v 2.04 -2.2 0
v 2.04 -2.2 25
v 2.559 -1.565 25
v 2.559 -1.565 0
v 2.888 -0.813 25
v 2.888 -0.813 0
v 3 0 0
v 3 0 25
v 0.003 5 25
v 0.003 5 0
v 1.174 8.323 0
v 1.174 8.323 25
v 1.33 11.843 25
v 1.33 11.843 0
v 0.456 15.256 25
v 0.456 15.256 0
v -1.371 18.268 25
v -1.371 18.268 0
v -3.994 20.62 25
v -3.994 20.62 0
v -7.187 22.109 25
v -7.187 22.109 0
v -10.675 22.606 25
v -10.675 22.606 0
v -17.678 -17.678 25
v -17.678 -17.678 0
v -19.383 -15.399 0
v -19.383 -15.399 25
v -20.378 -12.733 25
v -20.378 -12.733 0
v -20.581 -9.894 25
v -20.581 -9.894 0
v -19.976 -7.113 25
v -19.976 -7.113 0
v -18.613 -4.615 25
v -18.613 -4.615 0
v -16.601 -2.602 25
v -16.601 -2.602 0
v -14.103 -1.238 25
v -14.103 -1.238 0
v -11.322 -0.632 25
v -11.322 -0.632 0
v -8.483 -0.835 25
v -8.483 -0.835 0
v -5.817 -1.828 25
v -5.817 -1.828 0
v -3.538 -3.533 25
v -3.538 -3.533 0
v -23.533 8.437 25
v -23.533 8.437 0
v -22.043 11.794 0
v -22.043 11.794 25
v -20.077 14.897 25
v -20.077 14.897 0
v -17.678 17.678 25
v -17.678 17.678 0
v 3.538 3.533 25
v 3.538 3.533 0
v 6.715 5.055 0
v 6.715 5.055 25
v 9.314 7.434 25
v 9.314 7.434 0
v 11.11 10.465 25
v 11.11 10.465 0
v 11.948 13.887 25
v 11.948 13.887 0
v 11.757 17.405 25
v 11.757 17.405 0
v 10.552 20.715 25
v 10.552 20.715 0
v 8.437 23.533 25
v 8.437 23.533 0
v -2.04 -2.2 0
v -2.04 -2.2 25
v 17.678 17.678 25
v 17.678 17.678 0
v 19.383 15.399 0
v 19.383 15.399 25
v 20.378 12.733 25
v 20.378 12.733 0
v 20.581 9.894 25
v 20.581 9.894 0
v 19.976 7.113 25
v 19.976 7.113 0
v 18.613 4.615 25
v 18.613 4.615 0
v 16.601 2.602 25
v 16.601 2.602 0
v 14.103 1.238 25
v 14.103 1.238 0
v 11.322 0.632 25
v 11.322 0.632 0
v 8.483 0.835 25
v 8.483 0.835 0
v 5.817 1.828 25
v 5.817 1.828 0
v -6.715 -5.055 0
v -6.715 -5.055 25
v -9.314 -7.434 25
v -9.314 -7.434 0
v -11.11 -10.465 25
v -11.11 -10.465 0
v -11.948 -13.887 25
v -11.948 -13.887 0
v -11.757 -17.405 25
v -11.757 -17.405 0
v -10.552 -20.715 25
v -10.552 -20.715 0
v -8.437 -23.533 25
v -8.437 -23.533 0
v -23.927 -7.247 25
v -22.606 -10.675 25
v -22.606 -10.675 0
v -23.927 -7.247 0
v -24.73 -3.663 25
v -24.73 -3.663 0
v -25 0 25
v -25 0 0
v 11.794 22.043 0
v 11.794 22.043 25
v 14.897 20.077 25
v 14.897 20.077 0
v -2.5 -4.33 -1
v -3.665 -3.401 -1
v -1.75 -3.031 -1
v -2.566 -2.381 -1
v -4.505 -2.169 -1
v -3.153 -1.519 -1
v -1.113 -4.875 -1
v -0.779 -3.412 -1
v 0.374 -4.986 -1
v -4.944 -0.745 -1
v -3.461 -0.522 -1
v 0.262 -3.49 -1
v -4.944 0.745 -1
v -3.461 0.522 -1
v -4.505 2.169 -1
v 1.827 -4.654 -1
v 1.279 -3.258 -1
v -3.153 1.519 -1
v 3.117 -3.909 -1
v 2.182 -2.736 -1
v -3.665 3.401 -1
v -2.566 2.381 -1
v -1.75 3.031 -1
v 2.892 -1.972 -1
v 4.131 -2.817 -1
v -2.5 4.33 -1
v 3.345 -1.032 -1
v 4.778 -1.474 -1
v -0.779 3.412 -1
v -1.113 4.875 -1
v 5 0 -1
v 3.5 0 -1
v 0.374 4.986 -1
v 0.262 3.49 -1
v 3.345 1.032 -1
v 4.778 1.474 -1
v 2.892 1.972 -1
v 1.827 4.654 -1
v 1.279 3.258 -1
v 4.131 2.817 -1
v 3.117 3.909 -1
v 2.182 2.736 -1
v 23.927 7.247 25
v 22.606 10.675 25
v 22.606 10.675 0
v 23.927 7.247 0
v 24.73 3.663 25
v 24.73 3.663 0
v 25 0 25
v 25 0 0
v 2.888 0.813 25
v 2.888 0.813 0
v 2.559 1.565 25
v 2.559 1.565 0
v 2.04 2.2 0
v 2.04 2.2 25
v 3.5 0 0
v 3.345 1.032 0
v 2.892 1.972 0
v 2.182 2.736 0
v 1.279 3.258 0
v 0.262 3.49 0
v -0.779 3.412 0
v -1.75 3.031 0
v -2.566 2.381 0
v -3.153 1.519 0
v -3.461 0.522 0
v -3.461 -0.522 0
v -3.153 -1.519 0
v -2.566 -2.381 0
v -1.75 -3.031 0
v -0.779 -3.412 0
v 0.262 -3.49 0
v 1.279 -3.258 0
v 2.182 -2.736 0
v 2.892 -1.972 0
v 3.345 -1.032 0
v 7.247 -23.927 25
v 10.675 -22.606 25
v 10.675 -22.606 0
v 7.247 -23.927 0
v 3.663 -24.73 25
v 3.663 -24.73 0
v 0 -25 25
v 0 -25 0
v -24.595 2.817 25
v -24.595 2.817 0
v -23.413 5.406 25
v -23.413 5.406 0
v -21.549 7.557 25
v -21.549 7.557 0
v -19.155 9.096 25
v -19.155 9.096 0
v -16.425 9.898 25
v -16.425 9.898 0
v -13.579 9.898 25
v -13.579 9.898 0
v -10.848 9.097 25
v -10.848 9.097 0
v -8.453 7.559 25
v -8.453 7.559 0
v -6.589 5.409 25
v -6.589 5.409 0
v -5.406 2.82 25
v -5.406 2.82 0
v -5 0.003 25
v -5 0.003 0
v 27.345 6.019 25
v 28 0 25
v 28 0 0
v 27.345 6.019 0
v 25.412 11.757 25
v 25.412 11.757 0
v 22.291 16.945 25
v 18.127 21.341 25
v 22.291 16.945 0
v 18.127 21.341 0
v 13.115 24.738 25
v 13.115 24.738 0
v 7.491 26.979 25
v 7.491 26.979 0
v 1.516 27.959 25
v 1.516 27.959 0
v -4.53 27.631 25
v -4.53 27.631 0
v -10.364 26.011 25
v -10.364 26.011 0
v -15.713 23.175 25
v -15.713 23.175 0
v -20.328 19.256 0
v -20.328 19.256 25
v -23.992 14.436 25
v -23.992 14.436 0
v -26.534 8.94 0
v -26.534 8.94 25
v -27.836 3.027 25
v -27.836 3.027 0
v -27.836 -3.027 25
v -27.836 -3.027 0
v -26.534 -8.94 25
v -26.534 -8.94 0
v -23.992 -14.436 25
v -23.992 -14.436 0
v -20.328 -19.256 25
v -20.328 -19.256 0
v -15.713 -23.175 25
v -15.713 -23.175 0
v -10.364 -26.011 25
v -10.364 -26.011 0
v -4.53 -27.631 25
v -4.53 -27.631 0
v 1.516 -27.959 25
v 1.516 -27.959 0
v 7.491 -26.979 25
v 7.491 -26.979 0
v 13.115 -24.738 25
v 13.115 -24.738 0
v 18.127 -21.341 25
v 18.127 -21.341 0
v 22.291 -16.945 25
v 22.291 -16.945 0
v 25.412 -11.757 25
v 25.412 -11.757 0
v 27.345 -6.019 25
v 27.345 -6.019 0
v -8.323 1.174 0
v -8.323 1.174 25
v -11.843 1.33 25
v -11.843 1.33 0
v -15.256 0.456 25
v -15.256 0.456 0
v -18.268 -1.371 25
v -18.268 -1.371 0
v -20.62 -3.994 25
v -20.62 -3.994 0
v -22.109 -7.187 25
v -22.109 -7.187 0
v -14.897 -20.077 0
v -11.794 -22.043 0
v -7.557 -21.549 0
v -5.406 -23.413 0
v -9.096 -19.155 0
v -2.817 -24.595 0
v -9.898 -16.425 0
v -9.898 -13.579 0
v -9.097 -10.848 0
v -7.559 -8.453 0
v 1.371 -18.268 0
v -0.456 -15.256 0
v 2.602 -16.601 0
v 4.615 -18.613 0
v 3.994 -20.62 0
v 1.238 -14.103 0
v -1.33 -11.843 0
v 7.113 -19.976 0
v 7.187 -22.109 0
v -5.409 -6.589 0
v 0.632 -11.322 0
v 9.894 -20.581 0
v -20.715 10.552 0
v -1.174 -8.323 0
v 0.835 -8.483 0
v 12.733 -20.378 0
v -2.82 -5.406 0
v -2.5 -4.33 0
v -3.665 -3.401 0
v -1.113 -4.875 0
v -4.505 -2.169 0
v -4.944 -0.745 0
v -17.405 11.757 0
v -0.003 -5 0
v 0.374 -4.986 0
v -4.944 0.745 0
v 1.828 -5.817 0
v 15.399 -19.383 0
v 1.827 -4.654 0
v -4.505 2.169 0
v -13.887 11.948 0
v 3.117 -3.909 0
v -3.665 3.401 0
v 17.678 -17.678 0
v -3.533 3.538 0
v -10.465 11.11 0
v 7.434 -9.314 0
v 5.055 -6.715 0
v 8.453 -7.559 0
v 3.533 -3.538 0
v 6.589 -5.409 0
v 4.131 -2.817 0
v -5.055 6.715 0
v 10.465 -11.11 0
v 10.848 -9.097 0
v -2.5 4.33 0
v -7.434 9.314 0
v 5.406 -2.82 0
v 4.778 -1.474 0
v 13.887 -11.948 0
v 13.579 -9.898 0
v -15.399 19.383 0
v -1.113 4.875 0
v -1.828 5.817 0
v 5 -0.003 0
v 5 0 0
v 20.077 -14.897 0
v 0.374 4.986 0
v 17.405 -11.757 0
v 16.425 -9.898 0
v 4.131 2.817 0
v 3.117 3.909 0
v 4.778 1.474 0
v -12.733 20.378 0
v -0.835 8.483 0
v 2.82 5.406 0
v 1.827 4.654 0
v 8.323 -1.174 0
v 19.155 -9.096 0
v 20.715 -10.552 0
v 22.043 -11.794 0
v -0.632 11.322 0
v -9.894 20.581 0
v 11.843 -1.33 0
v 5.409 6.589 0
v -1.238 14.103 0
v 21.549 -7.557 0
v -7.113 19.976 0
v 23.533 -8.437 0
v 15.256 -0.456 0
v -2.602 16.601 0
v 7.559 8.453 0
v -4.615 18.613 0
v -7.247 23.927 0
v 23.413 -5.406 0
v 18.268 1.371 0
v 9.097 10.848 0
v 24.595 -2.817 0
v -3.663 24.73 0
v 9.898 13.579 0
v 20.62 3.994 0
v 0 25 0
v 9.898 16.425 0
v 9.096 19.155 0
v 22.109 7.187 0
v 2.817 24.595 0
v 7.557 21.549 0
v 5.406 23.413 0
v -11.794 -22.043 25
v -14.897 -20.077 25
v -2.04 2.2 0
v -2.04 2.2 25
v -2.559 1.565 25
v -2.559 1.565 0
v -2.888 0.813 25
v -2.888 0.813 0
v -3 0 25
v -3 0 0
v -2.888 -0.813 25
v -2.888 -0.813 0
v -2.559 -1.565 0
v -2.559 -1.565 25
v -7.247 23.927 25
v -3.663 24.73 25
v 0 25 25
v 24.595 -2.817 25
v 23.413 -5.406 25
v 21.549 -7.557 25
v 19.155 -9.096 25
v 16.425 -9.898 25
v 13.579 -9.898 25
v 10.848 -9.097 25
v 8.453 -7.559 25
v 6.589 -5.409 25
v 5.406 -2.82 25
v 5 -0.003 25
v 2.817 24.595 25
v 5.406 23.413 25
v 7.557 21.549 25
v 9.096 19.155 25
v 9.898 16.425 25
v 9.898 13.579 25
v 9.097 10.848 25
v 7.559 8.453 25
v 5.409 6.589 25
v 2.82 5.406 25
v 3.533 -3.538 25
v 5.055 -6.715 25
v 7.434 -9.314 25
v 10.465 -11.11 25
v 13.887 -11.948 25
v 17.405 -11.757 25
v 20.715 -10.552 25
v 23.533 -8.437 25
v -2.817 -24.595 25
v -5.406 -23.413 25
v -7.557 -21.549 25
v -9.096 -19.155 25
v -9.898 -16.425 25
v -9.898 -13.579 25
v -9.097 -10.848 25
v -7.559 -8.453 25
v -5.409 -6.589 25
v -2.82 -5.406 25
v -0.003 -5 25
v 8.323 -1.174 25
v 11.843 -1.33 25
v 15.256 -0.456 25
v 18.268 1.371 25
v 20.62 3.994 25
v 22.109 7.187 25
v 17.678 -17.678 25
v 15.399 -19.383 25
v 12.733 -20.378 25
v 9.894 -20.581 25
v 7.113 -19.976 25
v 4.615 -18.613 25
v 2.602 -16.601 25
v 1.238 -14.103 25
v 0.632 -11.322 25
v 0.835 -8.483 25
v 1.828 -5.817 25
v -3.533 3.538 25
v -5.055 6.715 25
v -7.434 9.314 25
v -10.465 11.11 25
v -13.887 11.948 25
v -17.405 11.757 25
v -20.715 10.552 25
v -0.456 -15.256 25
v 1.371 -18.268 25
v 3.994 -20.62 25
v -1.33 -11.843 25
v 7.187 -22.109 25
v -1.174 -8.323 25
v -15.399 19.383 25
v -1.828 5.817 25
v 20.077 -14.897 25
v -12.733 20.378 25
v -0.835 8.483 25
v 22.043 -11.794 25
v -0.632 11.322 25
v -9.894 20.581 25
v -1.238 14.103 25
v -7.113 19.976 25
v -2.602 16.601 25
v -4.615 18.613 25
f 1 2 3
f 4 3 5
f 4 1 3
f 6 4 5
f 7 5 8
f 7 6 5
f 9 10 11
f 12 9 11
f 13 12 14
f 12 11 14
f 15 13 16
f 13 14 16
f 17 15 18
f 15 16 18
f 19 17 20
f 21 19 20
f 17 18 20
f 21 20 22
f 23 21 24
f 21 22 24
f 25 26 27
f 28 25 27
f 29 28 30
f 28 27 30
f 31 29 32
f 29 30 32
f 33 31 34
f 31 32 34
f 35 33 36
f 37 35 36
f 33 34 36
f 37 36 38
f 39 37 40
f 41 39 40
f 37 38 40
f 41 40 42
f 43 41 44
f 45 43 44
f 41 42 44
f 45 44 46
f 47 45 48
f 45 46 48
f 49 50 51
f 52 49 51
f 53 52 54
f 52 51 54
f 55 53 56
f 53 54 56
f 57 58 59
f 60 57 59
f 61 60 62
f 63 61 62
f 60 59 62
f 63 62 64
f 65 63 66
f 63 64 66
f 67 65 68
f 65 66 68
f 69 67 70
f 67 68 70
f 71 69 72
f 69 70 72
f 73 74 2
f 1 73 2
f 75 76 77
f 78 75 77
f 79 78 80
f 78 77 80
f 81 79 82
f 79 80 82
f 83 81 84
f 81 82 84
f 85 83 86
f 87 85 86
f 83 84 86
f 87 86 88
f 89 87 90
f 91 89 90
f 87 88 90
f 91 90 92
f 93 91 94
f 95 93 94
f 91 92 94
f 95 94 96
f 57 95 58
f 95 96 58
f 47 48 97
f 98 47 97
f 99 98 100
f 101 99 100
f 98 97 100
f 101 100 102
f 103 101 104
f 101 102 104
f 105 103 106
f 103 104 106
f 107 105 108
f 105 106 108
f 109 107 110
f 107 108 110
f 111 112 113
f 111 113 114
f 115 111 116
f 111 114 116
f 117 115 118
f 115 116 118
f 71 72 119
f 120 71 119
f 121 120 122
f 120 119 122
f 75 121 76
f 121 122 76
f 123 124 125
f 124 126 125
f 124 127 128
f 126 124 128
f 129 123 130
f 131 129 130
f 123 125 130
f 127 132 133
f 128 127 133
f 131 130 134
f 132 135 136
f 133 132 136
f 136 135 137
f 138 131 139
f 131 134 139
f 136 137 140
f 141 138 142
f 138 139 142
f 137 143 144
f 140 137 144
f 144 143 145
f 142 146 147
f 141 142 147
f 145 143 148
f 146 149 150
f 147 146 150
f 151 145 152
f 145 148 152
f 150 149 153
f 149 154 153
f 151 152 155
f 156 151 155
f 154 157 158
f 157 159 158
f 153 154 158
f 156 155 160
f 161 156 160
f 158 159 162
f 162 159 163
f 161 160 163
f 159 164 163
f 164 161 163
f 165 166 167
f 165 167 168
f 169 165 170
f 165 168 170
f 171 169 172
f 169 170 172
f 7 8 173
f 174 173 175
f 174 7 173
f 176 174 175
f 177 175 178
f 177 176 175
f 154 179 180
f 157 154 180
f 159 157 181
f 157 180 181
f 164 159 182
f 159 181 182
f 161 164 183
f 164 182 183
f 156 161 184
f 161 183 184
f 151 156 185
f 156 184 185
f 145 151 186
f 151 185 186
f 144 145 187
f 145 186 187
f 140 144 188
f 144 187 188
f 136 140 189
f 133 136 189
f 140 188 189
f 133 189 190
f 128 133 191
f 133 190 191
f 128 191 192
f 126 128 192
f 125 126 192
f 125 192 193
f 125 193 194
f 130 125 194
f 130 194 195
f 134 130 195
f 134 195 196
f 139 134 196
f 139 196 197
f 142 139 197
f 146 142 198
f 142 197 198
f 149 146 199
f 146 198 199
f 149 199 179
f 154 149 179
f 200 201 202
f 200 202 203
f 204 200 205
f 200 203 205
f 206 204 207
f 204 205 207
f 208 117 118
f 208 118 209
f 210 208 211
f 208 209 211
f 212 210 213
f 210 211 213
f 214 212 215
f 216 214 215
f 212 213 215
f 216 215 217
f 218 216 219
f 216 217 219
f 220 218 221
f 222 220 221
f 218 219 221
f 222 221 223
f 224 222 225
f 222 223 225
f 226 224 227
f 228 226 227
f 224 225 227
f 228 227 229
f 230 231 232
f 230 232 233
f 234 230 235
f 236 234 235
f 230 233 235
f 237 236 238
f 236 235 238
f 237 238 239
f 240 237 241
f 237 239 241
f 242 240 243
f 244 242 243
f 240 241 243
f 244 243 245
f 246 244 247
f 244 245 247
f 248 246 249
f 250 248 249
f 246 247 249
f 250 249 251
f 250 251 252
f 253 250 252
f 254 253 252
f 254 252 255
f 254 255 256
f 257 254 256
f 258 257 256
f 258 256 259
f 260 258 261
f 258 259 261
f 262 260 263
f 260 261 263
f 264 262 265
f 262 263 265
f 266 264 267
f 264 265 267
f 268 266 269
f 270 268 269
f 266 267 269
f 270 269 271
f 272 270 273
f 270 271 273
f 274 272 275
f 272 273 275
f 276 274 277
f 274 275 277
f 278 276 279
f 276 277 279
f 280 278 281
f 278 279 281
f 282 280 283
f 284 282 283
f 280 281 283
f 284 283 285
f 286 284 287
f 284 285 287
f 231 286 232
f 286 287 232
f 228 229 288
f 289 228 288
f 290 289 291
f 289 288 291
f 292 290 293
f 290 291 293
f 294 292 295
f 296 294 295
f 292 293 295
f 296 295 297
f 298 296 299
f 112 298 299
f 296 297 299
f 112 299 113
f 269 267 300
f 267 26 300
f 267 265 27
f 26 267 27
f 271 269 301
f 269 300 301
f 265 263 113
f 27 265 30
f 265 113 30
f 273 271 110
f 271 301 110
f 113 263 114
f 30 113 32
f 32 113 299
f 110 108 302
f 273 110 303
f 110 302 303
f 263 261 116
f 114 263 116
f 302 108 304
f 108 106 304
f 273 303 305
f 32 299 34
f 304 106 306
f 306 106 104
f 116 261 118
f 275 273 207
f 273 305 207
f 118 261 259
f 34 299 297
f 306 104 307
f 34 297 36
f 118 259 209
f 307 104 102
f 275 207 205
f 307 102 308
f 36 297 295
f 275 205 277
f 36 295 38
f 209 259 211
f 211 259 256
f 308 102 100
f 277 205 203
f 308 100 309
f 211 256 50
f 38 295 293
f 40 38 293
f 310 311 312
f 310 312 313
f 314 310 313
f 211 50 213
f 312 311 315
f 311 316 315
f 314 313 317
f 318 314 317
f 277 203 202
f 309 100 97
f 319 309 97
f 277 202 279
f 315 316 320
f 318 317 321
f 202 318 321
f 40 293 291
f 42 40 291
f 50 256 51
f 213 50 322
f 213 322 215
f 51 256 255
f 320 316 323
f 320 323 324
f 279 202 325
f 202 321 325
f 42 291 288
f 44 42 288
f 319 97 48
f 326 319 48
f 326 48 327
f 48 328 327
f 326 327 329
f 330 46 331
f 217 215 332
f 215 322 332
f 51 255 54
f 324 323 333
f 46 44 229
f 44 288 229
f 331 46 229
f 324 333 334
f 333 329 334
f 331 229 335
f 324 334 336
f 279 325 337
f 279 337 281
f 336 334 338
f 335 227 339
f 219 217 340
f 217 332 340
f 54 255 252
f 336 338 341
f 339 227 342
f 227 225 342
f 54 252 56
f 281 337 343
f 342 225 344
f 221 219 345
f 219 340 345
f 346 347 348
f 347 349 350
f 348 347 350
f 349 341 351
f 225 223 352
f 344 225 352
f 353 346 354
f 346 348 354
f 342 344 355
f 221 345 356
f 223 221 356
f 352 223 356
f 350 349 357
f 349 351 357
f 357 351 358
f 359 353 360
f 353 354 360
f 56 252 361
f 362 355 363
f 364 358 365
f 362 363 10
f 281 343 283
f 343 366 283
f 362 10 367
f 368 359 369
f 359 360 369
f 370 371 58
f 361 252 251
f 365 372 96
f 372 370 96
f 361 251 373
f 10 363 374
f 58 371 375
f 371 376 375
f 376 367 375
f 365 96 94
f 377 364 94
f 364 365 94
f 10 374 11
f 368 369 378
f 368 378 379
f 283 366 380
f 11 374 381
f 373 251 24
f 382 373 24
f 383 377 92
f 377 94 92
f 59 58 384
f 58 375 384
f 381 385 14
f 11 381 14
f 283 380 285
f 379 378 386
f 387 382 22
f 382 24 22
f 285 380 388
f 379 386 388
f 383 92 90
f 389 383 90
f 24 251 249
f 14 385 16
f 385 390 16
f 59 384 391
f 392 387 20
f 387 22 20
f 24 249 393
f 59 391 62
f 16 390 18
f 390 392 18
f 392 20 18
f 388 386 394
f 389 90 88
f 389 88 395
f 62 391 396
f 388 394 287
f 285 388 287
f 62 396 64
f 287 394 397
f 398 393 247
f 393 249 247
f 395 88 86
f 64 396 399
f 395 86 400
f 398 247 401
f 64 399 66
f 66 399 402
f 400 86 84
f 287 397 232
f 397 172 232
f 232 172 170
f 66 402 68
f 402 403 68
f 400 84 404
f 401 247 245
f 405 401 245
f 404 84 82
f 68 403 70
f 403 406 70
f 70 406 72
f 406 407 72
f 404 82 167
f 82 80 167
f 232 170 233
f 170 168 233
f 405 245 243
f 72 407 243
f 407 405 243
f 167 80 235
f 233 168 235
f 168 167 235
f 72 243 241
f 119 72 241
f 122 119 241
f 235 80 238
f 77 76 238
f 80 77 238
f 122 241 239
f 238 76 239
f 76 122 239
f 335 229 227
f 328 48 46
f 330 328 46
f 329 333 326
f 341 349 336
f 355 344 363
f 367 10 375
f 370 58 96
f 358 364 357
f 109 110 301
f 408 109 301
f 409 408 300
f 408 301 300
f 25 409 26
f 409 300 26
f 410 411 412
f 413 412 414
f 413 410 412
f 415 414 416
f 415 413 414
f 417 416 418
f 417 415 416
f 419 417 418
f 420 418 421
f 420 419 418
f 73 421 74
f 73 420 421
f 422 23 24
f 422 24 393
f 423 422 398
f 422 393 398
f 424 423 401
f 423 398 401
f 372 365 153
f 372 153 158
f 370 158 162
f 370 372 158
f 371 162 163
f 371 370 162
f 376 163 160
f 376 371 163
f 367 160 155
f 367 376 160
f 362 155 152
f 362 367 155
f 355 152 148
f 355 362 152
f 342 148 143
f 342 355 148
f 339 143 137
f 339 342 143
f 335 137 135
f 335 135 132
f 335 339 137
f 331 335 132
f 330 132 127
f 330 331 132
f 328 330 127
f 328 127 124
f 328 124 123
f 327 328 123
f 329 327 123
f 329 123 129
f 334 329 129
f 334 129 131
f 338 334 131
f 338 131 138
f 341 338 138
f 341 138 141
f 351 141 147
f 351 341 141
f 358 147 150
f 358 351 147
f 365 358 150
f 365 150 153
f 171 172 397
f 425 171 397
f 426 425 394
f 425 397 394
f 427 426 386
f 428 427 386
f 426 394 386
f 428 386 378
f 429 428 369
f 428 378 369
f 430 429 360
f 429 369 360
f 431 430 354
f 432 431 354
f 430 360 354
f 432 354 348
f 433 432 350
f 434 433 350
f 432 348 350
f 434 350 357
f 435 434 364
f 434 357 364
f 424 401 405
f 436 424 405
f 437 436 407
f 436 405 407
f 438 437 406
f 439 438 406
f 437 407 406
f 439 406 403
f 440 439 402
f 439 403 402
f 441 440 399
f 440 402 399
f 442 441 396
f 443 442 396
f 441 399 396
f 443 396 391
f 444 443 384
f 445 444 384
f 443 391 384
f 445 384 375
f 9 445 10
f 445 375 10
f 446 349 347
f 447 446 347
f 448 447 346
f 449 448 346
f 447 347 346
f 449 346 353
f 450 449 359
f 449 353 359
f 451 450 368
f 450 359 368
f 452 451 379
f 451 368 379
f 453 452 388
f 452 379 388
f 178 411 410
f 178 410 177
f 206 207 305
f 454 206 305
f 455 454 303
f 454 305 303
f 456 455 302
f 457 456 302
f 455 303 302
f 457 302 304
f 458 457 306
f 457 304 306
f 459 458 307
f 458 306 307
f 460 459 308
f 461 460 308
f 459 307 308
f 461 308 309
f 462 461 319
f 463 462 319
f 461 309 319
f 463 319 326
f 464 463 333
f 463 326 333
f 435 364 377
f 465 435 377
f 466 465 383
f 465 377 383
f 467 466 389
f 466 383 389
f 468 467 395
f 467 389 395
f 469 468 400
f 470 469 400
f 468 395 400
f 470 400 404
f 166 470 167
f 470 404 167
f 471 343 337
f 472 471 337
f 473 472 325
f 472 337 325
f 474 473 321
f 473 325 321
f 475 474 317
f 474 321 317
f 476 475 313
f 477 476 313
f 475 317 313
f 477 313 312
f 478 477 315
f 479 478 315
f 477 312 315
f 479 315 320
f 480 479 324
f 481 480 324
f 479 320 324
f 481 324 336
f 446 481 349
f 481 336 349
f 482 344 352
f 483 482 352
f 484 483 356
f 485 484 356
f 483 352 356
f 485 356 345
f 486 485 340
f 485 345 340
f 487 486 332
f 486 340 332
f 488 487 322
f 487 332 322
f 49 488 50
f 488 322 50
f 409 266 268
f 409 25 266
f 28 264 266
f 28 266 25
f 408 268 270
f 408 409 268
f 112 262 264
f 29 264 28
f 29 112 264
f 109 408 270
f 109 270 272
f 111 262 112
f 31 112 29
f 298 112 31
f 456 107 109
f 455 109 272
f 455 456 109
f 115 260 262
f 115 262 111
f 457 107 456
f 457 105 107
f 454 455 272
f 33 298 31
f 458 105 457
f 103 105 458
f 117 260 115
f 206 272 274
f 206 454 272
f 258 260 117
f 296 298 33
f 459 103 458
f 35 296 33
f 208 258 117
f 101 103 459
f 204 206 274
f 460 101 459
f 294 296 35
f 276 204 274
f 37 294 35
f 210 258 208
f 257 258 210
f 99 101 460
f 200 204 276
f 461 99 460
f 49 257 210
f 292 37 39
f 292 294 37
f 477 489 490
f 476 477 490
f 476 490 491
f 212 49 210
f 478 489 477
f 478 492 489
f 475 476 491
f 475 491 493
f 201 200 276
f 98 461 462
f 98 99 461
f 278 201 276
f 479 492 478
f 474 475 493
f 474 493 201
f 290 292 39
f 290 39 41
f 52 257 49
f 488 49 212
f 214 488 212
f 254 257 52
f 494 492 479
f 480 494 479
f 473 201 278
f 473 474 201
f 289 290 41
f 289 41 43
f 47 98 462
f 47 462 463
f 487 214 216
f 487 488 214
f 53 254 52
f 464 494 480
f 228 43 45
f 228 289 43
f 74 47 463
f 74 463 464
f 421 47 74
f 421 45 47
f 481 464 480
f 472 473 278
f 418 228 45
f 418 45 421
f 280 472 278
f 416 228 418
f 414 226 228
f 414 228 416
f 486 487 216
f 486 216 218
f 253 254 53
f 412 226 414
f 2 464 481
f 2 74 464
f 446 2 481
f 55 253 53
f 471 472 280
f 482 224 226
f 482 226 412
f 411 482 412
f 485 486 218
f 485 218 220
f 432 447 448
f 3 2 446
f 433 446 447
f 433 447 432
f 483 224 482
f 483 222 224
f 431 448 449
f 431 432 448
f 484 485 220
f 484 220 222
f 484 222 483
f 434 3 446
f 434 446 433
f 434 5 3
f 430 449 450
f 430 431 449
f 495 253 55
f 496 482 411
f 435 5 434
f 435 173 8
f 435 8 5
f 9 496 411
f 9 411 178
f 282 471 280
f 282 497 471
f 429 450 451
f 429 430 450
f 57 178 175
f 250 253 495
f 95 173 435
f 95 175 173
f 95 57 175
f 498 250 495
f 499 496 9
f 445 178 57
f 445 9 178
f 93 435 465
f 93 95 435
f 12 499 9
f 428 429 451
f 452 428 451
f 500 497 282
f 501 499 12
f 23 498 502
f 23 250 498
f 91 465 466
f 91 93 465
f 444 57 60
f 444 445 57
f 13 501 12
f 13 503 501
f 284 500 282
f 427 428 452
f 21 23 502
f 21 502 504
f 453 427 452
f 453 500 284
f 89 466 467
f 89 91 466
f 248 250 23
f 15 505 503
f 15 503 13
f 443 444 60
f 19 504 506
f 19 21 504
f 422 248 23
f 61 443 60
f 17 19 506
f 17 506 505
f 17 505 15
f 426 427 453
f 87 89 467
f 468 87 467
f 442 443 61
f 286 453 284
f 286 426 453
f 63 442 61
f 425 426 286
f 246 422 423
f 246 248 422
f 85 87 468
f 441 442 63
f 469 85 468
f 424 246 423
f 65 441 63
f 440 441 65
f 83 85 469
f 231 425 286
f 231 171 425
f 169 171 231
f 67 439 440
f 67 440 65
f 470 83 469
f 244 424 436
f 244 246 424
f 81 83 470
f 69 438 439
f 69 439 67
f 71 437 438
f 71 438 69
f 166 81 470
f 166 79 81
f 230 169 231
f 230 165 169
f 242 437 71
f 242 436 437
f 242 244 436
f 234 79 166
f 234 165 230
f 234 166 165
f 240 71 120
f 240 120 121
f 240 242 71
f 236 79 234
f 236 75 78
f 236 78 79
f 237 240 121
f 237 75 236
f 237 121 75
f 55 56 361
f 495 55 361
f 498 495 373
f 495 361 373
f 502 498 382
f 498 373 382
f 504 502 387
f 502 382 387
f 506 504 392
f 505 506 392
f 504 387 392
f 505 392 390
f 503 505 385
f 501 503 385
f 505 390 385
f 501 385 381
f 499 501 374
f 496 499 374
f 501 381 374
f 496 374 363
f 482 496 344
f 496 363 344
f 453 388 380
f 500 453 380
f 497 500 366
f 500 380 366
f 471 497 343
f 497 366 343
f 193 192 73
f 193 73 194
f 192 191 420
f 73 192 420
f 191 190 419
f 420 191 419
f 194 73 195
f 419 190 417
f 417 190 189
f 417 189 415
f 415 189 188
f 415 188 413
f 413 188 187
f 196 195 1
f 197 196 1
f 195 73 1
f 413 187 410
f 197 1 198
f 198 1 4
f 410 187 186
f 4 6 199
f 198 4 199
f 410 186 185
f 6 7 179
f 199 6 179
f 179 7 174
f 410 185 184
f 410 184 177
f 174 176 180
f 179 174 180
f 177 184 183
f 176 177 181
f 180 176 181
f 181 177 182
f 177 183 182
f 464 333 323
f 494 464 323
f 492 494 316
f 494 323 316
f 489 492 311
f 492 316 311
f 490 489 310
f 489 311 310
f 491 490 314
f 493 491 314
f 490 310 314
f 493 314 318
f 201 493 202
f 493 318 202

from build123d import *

# Parameters (mm, degrees)
F0_R     = 28
F1_DEPTH = 25
F2_W     = 4.0792156109
F2_H     = 4.4
F3_DEPTH = 30
F4_R     = 5
F4_R_2   = 3.5
F5_DEPTH = 1


# Not quite as in the source:
# - ends of sketch curves that miss each other by under 0.0002 mm in the source are joined


with BuildPart() as f1:
    # F0 (on Top) → F1 (new body)
    with BuildSketch(Plane.XY):
        Circle(F0_R)
        with BuildLine():
            ThreePointArc((22.6064085074, 10.6747503202), (24.3942638, 5.4699080119), (25, 0))
            ThreePointArc((25, 0), (24.6306042082, -4.2817445441), (23.5333330927, -8.4369564149))
            ThreePointArc((23.5333330927, -8.4369564149), (21.1171584026, -13.3815403074), (17.6776695297, -17.6776695297))
            ThreePointArc((17.6776695297, -17.6776695297), (14.3888166579, -20.4441178628), (10.6747503202, -22.6064085074))
            ThreePointArc((10.6747503202, -22.6064085074), (5.4699080119, -24.3942638), (0, -25))
            ThreePointArc((0, -25), (-4.2817445441, -24.6306042082), (-8.4369564149, -23.5333330927))
            ThreePointArc((-8.4369564149, -23.5333330927), (-13.3815403074, -21.1171584026), (-17.6776695297, -17.6776695297))
            ThreePointArc((-17.6776695297, -17.6776695297), (-20.4441178628, -14.3888166579), (-22.6064085074, -10.6747503202))
            ThreePointArc((-22.6064085074, -10.6747503202), (-24.3942638, -5.4699080119), (-25, 0))
            ThreePointArc((-25, 0), (-24.6306042082, 4.2817445441), (-23.5333330927, 8.4369564149))
            ThreePointArc((-23.5333330927, 8.4369564149), (-21.1171584026, 13.3815403074), (-17.6776695297, 17.6776695297))
            ThreePointArc((-17.6776695297, 17.6776695297), (-14.3888166579, 20.4441178628), (-10.6747503202, 22.6064085074))
            ThreePointArc((-10.6747503202, 22.6064085074), (-5.4699080119, 24.3942638), (0, 25))
            ThreePointArc((0, 25), (4.2817445441, 24.6306042082), (8.4369564149, 23.5333330927))
            ThreePointArc((8.4369564149, 23.5333330927), (13.3815403074, 21.1171584026), (17.6776695297, 17.6776695297))
            ThreePointArc((17.6776695297, 17.6776695297), (20.4441178628, 14.3888166579), (22.6064085074, 10.6747503202))
        make_face(mode=Mode.SUBTRACT)
        with BuildLine():
            ThreePointArc((23.5333330927, -8.4369564149), (24.6306042082, -4.2817445441), (25, 0))
            ThreePointArc((25, 0), (15.0015557257, -9.999999879), (5.0000004841, -0.0031114513))
            ThreePointArc((5.0000004841, -0.0031114513), (16.8293380679, 0.3461163718), (22.6064085074, 10.6747503202))
            ThreePointArc((22.6064085074, 10.6747503202), (20.4441178628, 14.3888166579), (17.6776695297, 17.6776695297))
            ThreePointArc((17.6776695297, 17.6776695297), (17.6787695083, 3.5366340557), (3.5377343766, 3.5333341199))
            ThreePointArc((3.5377343766, 3.5333341199), (11.6553978371, 12.1448803043), (8.4369564149, 23.5333330927))
            ThreePointArc((8.4369564149, 23.5333330927), (4.2817445441, 24.6306042082), (0, 25))
            ThreePointArc((0, 25), (9.999999879, 15.0015557257), (0.0031114513, 5.0000004841))
            ThreePointArc((0.0031114513, 5.0000004841), (-0.3461163718, 16.8293380679), (-10.6747503202, 22.6064085074))
            ThreePointArc((-10.6747503202, 22.6064085074), (-14.3888166579, 20.4441178628), (-17.6776695297, 17.6776695297))
            ThreePointArc((-17.6776695297, 17.6776695297), (-3.5366340557, 17.6787695083), (-3.5333341199, 3.5377343766))
            ThreePointArc((-3.5333341199, 3.5377343766), (-12.1448803043, 11.6553978371), (-23.5333330927, 8.4369564149))
            ThreePointArc((-23.5333330927, 8.4369564149), (-24.6306042082, 4.2817445441), (-25, 0))
            ThreePointArc((-25, 0), (-15.0015556407, 9.999999879), (-5.000000484, 0.0031112813))
            ThreePointArc((-5.000000484, 0.0031112813), (-16.8293380679, -0.3461163718), (-22.6064085074, -10.6747503202))
            ThreePointArc((-22.6064085074, -10.6747503202), (-20.4441178628, -14.3888166579), (-17.6776695297, -17.6776695297))
            ThreePointArc((-17.6776695297, -17.6776695297), (-17.6787695083, -3.5366340557), (-3.5377343766, -3.5333341199))
            ThreePointArc((-3.5377343766, -3.5333341199), (-11.6553978371, -12.1448803043), (-8.4369564149, -23.5333330927))
            ThreePointArc((-8.4369564149, -23.5333330927), (-4.2817445441, -24.6306042082), (0, -25))
            ThreePointArc((0, -25), (-9.999999879, -15.0015557257), (-0.0031114513, -5.0000004841))
            ThreePointArc((-0.0031114513, -5.0000004841), (0.3461163718, -16.8293380679), (10.6747503202, -22.6064085074))
            ThreePointArc((10.6747503202, -22.6064085074), (14.3888166579, -20.4441178628), (17.6776695297, -17.6776695297))
            ThreePointArc((17.6776695297, -17.6776695297), (3.5366340557, -17.6787695083), (3.5333341199, -3.5377343766))
            ThreePointArc((3.5333341199, -3.5377343766), (12.1448803043, -11.6553978371), (23.5333330927, -8.4369564149))
        make_face()
    extrude(amount=F1_DEPTH)

    # F2 (on Top) → F3 (cut)
    with BuildSketch(Plane.XY):
        with BuildLine():
            Line((-2.0396078054, -2.2), (-2.0396078054, 2.2))
            ThreePointArc((-2.0396078054, 2.2), (-3, 0), (-2.0396078054, -2.2))
        make_face()
        Rectangle(F2_W, F2_H)
        with BuildLine():
            ThreePointArc((2.0396078054, -2.2), (2.7494384351, -1.2002450966), (3, 0))
            ThreePointArc((3, 0), (2.7494384351, 1.2002450966), (2.0396078054, 2.2))
            Line((2.0396078054, 2.2), (2.0396078054, -2.2))
        make_face()
    extrude(amount=F3_DEPTH, mode=Mode.SUBTRACT)

    # F4 (on Top) → F5 (join)
    with BuildSketch(Plane.XY):
        Circle(F4_R)
        Circle(F4_R_2, mode=Mode.SUBTRACT)
    extrude(amount=-F5_DEPTH)


solid = f1.part
